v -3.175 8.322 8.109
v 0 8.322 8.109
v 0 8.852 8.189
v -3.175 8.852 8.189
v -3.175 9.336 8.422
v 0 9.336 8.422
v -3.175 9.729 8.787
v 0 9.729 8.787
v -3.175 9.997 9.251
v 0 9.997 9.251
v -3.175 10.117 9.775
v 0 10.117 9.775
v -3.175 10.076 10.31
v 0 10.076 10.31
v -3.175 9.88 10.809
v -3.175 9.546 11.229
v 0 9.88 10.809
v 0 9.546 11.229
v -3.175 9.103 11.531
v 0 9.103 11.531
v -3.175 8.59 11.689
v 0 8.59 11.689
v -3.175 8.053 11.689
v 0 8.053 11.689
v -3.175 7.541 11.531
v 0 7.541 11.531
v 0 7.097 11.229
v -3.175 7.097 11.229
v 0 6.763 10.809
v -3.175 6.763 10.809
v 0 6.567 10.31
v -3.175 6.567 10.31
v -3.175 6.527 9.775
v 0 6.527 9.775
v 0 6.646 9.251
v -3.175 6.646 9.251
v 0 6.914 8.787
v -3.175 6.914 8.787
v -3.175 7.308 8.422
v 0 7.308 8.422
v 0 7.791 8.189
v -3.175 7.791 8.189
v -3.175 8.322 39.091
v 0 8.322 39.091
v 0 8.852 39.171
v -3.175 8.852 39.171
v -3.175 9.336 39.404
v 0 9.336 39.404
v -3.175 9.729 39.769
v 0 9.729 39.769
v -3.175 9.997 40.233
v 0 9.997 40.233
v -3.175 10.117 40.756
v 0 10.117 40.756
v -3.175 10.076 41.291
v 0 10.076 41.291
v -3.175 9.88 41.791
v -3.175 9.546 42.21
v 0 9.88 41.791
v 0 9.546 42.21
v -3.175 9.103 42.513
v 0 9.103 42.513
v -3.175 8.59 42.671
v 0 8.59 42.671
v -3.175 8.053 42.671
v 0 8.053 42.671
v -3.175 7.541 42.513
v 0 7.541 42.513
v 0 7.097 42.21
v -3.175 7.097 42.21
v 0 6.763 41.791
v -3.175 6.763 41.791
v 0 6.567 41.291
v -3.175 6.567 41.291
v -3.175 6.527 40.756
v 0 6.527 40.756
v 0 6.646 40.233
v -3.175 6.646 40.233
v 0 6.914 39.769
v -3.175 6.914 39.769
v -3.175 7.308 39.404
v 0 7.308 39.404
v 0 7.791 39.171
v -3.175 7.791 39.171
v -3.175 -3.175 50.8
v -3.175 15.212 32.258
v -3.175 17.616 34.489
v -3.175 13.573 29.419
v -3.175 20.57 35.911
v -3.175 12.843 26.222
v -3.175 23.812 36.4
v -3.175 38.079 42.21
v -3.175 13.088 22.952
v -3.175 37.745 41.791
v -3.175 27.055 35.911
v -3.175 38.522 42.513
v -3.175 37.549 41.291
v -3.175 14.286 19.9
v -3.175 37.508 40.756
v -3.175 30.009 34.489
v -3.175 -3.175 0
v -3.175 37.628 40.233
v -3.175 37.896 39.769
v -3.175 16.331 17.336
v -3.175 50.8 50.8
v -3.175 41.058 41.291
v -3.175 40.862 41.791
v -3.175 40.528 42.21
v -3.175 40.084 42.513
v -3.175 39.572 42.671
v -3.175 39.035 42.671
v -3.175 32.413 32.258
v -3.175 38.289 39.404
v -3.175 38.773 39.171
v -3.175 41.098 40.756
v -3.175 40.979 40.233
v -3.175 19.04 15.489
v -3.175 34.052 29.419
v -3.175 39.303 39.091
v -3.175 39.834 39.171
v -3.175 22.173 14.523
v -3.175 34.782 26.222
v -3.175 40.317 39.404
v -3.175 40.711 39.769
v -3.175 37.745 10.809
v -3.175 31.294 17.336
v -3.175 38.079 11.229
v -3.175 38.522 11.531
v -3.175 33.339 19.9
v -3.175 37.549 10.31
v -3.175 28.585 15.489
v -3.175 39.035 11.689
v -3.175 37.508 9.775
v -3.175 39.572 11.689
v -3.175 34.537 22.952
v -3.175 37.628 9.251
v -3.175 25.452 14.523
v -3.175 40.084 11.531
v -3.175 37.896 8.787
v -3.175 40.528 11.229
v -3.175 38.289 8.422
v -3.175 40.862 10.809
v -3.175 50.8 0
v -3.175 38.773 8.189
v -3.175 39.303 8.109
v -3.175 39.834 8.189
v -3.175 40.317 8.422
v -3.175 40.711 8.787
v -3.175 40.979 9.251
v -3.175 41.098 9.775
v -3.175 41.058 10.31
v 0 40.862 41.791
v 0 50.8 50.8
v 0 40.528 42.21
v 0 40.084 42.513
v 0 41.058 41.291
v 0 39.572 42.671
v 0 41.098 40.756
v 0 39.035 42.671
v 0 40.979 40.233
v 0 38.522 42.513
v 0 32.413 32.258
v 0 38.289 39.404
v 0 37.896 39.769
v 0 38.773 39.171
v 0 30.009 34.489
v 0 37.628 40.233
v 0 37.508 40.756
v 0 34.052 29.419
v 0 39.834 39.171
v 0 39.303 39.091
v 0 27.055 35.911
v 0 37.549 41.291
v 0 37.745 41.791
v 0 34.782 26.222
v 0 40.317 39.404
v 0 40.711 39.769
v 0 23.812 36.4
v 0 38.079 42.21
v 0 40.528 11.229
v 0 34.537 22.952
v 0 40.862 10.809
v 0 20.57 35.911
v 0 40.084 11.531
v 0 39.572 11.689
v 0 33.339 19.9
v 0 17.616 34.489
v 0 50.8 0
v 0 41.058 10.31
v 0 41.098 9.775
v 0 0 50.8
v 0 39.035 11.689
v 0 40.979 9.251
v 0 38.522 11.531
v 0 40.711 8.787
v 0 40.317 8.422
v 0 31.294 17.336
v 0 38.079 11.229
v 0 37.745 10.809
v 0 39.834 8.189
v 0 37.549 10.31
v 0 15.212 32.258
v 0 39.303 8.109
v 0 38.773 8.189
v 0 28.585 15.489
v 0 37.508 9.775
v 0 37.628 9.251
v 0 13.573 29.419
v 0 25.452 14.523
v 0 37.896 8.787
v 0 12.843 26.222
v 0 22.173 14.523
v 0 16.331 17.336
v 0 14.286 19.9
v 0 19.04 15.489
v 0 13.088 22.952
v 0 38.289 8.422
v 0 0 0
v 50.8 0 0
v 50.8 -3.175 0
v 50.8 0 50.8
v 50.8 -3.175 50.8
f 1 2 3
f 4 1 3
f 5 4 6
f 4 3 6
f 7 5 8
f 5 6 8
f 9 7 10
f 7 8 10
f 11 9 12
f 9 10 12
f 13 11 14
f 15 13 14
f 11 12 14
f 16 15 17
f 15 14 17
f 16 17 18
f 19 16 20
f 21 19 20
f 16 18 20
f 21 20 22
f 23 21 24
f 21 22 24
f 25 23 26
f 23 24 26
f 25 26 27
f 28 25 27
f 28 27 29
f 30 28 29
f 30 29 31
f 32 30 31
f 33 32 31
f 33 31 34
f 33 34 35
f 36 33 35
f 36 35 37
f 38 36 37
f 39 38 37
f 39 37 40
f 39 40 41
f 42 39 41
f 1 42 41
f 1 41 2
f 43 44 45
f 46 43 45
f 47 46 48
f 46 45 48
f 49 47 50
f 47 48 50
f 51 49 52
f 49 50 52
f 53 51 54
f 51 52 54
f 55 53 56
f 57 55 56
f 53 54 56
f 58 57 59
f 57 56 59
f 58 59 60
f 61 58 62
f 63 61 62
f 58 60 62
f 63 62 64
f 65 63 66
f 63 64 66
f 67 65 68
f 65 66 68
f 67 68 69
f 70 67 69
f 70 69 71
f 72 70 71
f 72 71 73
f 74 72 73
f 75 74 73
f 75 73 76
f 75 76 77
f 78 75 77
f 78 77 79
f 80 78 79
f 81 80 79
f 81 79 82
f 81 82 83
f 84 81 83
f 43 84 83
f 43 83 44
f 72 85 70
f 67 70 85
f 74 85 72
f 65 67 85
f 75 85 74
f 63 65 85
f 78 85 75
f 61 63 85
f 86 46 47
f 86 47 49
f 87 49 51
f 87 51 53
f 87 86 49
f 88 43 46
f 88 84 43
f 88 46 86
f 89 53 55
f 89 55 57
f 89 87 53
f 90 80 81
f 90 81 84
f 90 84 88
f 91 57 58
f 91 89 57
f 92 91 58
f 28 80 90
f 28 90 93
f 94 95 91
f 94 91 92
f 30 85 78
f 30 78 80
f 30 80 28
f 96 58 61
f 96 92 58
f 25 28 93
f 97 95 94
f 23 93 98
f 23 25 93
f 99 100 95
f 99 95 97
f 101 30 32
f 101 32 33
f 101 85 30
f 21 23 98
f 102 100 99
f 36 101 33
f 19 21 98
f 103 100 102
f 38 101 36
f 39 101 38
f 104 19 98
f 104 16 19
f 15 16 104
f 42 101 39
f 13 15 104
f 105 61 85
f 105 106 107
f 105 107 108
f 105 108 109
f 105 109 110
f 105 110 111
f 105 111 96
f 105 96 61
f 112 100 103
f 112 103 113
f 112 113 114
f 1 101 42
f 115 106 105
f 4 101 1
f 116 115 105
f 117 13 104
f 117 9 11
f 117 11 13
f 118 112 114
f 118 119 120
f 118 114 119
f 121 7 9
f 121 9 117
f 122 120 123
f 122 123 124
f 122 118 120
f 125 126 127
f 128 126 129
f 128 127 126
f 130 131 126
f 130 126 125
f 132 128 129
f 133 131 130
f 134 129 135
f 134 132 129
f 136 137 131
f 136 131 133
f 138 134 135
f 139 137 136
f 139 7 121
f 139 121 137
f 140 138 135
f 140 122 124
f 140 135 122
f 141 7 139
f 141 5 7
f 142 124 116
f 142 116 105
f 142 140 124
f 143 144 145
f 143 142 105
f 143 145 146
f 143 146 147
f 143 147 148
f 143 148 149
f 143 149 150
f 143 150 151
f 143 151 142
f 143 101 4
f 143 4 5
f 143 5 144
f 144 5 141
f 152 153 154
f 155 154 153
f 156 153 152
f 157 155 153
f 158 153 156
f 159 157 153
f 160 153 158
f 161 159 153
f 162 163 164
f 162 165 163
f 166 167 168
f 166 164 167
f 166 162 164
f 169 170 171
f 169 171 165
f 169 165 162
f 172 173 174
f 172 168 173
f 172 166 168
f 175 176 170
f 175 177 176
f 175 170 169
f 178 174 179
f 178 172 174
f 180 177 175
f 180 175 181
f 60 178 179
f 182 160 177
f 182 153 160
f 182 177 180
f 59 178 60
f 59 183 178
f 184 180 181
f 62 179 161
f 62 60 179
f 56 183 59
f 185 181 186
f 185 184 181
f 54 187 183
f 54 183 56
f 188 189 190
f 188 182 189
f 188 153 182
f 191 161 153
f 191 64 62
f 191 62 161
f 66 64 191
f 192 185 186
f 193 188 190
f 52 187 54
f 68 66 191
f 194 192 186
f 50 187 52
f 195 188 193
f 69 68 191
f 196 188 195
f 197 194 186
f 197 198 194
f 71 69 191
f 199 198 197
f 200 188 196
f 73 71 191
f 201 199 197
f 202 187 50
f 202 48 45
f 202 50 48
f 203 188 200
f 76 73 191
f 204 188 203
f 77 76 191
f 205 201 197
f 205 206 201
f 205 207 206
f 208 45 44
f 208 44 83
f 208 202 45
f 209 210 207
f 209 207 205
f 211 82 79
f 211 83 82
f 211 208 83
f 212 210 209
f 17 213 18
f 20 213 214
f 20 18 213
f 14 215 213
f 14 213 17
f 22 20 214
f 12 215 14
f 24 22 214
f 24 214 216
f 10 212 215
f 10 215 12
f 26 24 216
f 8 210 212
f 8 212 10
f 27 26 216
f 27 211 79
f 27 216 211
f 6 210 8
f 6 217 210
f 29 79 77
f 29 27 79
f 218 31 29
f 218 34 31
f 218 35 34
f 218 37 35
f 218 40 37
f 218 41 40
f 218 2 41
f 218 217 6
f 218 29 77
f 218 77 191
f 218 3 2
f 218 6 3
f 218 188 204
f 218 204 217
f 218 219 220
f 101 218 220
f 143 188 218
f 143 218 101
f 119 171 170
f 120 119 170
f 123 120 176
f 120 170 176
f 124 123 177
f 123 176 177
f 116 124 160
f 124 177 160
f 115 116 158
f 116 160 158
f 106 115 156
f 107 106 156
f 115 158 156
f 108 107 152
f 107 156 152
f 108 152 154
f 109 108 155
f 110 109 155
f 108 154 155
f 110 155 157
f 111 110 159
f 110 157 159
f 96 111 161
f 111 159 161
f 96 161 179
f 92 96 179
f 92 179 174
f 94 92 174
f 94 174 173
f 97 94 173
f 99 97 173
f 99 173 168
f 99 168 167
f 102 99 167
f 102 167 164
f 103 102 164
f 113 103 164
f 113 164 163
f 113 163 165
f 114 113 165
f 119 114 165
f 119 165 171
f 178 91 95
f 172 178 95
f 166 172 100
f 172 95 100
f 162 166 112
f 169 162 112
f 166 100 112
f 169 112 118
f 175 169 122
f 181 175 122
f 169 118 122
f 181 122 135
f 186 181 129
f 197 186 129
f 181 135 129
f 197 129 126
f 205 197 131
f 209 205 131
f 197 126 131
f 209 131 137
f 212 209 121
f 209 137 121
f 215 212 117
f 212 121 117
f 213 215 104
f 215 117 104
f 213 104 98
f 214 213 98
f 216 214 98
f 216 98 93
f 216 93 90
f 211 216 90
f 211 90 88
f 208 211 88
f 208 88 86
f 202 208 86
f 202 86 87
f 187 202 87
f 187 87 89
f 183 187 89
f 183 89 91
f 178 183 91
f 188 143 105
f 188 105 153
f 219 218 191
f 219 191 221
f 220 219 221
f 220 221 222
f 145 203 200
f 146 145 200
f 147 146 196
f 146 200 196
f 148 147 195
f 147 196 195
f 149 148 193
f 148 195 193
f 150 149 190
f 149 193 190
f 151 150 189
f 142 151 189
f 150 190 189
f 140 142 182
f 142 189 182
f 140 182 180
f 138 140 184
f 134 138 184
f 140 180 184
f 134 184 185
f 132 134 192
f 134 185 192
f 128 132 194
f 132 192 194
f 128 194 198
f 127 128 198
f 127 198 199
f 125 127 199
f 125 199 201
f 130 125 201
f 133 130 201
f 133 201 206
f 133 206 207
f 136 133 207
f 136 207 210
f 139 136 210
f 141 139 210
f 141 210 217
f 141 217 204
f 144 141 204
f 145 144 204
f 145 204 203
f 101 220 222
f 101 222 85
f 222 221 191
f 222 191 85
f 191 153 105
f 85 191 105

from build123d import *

# Parameters (mm, degrees)
EXTRUDE_THIN1_DEPTH  = 50.8
SKETCH2_R            = 11
CUT_EXTRUDE1_DEPTH   = 90.858670283
M3_CLEARANCE_HOLE1_D = 3.6


with BuildPart() as part:
    # Sketch1 → Extrude-Thin1 (new body)
    with BuildSketch(Plane.XY):
        Polygon((0, 50.8), (0, 0), (50.8, 0), (50.8, -3.175), (-3.175, -3.175), (-3.175, 50.8), align=None)
    extrude(amount=EXTRUDE_THIN1_DEPTH)

    # Sketch2 → Cut-Extrude1 (cut, through all)
    with BuildSketch(Plane.ZY.offset(3.175)):
        with Locations((25.4, 23.8125)):
            Circle(SKETCH2_R)
    extrude(amount=-CUT_EXTRUDE1_DEPTH, mode=Mode.SUBTRACT)

    # M3 Clearance Hole1 (through all)
    with Locations(Plane.ZY.offset(3.175)):
        with Locations((9.909058191, 39.303441809), (40.890941809, 39.303441809), (40.890941809, 8.321558191), (9.909058191, 8.321558191)):
            Hole(M3_CLEARANCE_HOLE1_D / 2)


solid = part.part
